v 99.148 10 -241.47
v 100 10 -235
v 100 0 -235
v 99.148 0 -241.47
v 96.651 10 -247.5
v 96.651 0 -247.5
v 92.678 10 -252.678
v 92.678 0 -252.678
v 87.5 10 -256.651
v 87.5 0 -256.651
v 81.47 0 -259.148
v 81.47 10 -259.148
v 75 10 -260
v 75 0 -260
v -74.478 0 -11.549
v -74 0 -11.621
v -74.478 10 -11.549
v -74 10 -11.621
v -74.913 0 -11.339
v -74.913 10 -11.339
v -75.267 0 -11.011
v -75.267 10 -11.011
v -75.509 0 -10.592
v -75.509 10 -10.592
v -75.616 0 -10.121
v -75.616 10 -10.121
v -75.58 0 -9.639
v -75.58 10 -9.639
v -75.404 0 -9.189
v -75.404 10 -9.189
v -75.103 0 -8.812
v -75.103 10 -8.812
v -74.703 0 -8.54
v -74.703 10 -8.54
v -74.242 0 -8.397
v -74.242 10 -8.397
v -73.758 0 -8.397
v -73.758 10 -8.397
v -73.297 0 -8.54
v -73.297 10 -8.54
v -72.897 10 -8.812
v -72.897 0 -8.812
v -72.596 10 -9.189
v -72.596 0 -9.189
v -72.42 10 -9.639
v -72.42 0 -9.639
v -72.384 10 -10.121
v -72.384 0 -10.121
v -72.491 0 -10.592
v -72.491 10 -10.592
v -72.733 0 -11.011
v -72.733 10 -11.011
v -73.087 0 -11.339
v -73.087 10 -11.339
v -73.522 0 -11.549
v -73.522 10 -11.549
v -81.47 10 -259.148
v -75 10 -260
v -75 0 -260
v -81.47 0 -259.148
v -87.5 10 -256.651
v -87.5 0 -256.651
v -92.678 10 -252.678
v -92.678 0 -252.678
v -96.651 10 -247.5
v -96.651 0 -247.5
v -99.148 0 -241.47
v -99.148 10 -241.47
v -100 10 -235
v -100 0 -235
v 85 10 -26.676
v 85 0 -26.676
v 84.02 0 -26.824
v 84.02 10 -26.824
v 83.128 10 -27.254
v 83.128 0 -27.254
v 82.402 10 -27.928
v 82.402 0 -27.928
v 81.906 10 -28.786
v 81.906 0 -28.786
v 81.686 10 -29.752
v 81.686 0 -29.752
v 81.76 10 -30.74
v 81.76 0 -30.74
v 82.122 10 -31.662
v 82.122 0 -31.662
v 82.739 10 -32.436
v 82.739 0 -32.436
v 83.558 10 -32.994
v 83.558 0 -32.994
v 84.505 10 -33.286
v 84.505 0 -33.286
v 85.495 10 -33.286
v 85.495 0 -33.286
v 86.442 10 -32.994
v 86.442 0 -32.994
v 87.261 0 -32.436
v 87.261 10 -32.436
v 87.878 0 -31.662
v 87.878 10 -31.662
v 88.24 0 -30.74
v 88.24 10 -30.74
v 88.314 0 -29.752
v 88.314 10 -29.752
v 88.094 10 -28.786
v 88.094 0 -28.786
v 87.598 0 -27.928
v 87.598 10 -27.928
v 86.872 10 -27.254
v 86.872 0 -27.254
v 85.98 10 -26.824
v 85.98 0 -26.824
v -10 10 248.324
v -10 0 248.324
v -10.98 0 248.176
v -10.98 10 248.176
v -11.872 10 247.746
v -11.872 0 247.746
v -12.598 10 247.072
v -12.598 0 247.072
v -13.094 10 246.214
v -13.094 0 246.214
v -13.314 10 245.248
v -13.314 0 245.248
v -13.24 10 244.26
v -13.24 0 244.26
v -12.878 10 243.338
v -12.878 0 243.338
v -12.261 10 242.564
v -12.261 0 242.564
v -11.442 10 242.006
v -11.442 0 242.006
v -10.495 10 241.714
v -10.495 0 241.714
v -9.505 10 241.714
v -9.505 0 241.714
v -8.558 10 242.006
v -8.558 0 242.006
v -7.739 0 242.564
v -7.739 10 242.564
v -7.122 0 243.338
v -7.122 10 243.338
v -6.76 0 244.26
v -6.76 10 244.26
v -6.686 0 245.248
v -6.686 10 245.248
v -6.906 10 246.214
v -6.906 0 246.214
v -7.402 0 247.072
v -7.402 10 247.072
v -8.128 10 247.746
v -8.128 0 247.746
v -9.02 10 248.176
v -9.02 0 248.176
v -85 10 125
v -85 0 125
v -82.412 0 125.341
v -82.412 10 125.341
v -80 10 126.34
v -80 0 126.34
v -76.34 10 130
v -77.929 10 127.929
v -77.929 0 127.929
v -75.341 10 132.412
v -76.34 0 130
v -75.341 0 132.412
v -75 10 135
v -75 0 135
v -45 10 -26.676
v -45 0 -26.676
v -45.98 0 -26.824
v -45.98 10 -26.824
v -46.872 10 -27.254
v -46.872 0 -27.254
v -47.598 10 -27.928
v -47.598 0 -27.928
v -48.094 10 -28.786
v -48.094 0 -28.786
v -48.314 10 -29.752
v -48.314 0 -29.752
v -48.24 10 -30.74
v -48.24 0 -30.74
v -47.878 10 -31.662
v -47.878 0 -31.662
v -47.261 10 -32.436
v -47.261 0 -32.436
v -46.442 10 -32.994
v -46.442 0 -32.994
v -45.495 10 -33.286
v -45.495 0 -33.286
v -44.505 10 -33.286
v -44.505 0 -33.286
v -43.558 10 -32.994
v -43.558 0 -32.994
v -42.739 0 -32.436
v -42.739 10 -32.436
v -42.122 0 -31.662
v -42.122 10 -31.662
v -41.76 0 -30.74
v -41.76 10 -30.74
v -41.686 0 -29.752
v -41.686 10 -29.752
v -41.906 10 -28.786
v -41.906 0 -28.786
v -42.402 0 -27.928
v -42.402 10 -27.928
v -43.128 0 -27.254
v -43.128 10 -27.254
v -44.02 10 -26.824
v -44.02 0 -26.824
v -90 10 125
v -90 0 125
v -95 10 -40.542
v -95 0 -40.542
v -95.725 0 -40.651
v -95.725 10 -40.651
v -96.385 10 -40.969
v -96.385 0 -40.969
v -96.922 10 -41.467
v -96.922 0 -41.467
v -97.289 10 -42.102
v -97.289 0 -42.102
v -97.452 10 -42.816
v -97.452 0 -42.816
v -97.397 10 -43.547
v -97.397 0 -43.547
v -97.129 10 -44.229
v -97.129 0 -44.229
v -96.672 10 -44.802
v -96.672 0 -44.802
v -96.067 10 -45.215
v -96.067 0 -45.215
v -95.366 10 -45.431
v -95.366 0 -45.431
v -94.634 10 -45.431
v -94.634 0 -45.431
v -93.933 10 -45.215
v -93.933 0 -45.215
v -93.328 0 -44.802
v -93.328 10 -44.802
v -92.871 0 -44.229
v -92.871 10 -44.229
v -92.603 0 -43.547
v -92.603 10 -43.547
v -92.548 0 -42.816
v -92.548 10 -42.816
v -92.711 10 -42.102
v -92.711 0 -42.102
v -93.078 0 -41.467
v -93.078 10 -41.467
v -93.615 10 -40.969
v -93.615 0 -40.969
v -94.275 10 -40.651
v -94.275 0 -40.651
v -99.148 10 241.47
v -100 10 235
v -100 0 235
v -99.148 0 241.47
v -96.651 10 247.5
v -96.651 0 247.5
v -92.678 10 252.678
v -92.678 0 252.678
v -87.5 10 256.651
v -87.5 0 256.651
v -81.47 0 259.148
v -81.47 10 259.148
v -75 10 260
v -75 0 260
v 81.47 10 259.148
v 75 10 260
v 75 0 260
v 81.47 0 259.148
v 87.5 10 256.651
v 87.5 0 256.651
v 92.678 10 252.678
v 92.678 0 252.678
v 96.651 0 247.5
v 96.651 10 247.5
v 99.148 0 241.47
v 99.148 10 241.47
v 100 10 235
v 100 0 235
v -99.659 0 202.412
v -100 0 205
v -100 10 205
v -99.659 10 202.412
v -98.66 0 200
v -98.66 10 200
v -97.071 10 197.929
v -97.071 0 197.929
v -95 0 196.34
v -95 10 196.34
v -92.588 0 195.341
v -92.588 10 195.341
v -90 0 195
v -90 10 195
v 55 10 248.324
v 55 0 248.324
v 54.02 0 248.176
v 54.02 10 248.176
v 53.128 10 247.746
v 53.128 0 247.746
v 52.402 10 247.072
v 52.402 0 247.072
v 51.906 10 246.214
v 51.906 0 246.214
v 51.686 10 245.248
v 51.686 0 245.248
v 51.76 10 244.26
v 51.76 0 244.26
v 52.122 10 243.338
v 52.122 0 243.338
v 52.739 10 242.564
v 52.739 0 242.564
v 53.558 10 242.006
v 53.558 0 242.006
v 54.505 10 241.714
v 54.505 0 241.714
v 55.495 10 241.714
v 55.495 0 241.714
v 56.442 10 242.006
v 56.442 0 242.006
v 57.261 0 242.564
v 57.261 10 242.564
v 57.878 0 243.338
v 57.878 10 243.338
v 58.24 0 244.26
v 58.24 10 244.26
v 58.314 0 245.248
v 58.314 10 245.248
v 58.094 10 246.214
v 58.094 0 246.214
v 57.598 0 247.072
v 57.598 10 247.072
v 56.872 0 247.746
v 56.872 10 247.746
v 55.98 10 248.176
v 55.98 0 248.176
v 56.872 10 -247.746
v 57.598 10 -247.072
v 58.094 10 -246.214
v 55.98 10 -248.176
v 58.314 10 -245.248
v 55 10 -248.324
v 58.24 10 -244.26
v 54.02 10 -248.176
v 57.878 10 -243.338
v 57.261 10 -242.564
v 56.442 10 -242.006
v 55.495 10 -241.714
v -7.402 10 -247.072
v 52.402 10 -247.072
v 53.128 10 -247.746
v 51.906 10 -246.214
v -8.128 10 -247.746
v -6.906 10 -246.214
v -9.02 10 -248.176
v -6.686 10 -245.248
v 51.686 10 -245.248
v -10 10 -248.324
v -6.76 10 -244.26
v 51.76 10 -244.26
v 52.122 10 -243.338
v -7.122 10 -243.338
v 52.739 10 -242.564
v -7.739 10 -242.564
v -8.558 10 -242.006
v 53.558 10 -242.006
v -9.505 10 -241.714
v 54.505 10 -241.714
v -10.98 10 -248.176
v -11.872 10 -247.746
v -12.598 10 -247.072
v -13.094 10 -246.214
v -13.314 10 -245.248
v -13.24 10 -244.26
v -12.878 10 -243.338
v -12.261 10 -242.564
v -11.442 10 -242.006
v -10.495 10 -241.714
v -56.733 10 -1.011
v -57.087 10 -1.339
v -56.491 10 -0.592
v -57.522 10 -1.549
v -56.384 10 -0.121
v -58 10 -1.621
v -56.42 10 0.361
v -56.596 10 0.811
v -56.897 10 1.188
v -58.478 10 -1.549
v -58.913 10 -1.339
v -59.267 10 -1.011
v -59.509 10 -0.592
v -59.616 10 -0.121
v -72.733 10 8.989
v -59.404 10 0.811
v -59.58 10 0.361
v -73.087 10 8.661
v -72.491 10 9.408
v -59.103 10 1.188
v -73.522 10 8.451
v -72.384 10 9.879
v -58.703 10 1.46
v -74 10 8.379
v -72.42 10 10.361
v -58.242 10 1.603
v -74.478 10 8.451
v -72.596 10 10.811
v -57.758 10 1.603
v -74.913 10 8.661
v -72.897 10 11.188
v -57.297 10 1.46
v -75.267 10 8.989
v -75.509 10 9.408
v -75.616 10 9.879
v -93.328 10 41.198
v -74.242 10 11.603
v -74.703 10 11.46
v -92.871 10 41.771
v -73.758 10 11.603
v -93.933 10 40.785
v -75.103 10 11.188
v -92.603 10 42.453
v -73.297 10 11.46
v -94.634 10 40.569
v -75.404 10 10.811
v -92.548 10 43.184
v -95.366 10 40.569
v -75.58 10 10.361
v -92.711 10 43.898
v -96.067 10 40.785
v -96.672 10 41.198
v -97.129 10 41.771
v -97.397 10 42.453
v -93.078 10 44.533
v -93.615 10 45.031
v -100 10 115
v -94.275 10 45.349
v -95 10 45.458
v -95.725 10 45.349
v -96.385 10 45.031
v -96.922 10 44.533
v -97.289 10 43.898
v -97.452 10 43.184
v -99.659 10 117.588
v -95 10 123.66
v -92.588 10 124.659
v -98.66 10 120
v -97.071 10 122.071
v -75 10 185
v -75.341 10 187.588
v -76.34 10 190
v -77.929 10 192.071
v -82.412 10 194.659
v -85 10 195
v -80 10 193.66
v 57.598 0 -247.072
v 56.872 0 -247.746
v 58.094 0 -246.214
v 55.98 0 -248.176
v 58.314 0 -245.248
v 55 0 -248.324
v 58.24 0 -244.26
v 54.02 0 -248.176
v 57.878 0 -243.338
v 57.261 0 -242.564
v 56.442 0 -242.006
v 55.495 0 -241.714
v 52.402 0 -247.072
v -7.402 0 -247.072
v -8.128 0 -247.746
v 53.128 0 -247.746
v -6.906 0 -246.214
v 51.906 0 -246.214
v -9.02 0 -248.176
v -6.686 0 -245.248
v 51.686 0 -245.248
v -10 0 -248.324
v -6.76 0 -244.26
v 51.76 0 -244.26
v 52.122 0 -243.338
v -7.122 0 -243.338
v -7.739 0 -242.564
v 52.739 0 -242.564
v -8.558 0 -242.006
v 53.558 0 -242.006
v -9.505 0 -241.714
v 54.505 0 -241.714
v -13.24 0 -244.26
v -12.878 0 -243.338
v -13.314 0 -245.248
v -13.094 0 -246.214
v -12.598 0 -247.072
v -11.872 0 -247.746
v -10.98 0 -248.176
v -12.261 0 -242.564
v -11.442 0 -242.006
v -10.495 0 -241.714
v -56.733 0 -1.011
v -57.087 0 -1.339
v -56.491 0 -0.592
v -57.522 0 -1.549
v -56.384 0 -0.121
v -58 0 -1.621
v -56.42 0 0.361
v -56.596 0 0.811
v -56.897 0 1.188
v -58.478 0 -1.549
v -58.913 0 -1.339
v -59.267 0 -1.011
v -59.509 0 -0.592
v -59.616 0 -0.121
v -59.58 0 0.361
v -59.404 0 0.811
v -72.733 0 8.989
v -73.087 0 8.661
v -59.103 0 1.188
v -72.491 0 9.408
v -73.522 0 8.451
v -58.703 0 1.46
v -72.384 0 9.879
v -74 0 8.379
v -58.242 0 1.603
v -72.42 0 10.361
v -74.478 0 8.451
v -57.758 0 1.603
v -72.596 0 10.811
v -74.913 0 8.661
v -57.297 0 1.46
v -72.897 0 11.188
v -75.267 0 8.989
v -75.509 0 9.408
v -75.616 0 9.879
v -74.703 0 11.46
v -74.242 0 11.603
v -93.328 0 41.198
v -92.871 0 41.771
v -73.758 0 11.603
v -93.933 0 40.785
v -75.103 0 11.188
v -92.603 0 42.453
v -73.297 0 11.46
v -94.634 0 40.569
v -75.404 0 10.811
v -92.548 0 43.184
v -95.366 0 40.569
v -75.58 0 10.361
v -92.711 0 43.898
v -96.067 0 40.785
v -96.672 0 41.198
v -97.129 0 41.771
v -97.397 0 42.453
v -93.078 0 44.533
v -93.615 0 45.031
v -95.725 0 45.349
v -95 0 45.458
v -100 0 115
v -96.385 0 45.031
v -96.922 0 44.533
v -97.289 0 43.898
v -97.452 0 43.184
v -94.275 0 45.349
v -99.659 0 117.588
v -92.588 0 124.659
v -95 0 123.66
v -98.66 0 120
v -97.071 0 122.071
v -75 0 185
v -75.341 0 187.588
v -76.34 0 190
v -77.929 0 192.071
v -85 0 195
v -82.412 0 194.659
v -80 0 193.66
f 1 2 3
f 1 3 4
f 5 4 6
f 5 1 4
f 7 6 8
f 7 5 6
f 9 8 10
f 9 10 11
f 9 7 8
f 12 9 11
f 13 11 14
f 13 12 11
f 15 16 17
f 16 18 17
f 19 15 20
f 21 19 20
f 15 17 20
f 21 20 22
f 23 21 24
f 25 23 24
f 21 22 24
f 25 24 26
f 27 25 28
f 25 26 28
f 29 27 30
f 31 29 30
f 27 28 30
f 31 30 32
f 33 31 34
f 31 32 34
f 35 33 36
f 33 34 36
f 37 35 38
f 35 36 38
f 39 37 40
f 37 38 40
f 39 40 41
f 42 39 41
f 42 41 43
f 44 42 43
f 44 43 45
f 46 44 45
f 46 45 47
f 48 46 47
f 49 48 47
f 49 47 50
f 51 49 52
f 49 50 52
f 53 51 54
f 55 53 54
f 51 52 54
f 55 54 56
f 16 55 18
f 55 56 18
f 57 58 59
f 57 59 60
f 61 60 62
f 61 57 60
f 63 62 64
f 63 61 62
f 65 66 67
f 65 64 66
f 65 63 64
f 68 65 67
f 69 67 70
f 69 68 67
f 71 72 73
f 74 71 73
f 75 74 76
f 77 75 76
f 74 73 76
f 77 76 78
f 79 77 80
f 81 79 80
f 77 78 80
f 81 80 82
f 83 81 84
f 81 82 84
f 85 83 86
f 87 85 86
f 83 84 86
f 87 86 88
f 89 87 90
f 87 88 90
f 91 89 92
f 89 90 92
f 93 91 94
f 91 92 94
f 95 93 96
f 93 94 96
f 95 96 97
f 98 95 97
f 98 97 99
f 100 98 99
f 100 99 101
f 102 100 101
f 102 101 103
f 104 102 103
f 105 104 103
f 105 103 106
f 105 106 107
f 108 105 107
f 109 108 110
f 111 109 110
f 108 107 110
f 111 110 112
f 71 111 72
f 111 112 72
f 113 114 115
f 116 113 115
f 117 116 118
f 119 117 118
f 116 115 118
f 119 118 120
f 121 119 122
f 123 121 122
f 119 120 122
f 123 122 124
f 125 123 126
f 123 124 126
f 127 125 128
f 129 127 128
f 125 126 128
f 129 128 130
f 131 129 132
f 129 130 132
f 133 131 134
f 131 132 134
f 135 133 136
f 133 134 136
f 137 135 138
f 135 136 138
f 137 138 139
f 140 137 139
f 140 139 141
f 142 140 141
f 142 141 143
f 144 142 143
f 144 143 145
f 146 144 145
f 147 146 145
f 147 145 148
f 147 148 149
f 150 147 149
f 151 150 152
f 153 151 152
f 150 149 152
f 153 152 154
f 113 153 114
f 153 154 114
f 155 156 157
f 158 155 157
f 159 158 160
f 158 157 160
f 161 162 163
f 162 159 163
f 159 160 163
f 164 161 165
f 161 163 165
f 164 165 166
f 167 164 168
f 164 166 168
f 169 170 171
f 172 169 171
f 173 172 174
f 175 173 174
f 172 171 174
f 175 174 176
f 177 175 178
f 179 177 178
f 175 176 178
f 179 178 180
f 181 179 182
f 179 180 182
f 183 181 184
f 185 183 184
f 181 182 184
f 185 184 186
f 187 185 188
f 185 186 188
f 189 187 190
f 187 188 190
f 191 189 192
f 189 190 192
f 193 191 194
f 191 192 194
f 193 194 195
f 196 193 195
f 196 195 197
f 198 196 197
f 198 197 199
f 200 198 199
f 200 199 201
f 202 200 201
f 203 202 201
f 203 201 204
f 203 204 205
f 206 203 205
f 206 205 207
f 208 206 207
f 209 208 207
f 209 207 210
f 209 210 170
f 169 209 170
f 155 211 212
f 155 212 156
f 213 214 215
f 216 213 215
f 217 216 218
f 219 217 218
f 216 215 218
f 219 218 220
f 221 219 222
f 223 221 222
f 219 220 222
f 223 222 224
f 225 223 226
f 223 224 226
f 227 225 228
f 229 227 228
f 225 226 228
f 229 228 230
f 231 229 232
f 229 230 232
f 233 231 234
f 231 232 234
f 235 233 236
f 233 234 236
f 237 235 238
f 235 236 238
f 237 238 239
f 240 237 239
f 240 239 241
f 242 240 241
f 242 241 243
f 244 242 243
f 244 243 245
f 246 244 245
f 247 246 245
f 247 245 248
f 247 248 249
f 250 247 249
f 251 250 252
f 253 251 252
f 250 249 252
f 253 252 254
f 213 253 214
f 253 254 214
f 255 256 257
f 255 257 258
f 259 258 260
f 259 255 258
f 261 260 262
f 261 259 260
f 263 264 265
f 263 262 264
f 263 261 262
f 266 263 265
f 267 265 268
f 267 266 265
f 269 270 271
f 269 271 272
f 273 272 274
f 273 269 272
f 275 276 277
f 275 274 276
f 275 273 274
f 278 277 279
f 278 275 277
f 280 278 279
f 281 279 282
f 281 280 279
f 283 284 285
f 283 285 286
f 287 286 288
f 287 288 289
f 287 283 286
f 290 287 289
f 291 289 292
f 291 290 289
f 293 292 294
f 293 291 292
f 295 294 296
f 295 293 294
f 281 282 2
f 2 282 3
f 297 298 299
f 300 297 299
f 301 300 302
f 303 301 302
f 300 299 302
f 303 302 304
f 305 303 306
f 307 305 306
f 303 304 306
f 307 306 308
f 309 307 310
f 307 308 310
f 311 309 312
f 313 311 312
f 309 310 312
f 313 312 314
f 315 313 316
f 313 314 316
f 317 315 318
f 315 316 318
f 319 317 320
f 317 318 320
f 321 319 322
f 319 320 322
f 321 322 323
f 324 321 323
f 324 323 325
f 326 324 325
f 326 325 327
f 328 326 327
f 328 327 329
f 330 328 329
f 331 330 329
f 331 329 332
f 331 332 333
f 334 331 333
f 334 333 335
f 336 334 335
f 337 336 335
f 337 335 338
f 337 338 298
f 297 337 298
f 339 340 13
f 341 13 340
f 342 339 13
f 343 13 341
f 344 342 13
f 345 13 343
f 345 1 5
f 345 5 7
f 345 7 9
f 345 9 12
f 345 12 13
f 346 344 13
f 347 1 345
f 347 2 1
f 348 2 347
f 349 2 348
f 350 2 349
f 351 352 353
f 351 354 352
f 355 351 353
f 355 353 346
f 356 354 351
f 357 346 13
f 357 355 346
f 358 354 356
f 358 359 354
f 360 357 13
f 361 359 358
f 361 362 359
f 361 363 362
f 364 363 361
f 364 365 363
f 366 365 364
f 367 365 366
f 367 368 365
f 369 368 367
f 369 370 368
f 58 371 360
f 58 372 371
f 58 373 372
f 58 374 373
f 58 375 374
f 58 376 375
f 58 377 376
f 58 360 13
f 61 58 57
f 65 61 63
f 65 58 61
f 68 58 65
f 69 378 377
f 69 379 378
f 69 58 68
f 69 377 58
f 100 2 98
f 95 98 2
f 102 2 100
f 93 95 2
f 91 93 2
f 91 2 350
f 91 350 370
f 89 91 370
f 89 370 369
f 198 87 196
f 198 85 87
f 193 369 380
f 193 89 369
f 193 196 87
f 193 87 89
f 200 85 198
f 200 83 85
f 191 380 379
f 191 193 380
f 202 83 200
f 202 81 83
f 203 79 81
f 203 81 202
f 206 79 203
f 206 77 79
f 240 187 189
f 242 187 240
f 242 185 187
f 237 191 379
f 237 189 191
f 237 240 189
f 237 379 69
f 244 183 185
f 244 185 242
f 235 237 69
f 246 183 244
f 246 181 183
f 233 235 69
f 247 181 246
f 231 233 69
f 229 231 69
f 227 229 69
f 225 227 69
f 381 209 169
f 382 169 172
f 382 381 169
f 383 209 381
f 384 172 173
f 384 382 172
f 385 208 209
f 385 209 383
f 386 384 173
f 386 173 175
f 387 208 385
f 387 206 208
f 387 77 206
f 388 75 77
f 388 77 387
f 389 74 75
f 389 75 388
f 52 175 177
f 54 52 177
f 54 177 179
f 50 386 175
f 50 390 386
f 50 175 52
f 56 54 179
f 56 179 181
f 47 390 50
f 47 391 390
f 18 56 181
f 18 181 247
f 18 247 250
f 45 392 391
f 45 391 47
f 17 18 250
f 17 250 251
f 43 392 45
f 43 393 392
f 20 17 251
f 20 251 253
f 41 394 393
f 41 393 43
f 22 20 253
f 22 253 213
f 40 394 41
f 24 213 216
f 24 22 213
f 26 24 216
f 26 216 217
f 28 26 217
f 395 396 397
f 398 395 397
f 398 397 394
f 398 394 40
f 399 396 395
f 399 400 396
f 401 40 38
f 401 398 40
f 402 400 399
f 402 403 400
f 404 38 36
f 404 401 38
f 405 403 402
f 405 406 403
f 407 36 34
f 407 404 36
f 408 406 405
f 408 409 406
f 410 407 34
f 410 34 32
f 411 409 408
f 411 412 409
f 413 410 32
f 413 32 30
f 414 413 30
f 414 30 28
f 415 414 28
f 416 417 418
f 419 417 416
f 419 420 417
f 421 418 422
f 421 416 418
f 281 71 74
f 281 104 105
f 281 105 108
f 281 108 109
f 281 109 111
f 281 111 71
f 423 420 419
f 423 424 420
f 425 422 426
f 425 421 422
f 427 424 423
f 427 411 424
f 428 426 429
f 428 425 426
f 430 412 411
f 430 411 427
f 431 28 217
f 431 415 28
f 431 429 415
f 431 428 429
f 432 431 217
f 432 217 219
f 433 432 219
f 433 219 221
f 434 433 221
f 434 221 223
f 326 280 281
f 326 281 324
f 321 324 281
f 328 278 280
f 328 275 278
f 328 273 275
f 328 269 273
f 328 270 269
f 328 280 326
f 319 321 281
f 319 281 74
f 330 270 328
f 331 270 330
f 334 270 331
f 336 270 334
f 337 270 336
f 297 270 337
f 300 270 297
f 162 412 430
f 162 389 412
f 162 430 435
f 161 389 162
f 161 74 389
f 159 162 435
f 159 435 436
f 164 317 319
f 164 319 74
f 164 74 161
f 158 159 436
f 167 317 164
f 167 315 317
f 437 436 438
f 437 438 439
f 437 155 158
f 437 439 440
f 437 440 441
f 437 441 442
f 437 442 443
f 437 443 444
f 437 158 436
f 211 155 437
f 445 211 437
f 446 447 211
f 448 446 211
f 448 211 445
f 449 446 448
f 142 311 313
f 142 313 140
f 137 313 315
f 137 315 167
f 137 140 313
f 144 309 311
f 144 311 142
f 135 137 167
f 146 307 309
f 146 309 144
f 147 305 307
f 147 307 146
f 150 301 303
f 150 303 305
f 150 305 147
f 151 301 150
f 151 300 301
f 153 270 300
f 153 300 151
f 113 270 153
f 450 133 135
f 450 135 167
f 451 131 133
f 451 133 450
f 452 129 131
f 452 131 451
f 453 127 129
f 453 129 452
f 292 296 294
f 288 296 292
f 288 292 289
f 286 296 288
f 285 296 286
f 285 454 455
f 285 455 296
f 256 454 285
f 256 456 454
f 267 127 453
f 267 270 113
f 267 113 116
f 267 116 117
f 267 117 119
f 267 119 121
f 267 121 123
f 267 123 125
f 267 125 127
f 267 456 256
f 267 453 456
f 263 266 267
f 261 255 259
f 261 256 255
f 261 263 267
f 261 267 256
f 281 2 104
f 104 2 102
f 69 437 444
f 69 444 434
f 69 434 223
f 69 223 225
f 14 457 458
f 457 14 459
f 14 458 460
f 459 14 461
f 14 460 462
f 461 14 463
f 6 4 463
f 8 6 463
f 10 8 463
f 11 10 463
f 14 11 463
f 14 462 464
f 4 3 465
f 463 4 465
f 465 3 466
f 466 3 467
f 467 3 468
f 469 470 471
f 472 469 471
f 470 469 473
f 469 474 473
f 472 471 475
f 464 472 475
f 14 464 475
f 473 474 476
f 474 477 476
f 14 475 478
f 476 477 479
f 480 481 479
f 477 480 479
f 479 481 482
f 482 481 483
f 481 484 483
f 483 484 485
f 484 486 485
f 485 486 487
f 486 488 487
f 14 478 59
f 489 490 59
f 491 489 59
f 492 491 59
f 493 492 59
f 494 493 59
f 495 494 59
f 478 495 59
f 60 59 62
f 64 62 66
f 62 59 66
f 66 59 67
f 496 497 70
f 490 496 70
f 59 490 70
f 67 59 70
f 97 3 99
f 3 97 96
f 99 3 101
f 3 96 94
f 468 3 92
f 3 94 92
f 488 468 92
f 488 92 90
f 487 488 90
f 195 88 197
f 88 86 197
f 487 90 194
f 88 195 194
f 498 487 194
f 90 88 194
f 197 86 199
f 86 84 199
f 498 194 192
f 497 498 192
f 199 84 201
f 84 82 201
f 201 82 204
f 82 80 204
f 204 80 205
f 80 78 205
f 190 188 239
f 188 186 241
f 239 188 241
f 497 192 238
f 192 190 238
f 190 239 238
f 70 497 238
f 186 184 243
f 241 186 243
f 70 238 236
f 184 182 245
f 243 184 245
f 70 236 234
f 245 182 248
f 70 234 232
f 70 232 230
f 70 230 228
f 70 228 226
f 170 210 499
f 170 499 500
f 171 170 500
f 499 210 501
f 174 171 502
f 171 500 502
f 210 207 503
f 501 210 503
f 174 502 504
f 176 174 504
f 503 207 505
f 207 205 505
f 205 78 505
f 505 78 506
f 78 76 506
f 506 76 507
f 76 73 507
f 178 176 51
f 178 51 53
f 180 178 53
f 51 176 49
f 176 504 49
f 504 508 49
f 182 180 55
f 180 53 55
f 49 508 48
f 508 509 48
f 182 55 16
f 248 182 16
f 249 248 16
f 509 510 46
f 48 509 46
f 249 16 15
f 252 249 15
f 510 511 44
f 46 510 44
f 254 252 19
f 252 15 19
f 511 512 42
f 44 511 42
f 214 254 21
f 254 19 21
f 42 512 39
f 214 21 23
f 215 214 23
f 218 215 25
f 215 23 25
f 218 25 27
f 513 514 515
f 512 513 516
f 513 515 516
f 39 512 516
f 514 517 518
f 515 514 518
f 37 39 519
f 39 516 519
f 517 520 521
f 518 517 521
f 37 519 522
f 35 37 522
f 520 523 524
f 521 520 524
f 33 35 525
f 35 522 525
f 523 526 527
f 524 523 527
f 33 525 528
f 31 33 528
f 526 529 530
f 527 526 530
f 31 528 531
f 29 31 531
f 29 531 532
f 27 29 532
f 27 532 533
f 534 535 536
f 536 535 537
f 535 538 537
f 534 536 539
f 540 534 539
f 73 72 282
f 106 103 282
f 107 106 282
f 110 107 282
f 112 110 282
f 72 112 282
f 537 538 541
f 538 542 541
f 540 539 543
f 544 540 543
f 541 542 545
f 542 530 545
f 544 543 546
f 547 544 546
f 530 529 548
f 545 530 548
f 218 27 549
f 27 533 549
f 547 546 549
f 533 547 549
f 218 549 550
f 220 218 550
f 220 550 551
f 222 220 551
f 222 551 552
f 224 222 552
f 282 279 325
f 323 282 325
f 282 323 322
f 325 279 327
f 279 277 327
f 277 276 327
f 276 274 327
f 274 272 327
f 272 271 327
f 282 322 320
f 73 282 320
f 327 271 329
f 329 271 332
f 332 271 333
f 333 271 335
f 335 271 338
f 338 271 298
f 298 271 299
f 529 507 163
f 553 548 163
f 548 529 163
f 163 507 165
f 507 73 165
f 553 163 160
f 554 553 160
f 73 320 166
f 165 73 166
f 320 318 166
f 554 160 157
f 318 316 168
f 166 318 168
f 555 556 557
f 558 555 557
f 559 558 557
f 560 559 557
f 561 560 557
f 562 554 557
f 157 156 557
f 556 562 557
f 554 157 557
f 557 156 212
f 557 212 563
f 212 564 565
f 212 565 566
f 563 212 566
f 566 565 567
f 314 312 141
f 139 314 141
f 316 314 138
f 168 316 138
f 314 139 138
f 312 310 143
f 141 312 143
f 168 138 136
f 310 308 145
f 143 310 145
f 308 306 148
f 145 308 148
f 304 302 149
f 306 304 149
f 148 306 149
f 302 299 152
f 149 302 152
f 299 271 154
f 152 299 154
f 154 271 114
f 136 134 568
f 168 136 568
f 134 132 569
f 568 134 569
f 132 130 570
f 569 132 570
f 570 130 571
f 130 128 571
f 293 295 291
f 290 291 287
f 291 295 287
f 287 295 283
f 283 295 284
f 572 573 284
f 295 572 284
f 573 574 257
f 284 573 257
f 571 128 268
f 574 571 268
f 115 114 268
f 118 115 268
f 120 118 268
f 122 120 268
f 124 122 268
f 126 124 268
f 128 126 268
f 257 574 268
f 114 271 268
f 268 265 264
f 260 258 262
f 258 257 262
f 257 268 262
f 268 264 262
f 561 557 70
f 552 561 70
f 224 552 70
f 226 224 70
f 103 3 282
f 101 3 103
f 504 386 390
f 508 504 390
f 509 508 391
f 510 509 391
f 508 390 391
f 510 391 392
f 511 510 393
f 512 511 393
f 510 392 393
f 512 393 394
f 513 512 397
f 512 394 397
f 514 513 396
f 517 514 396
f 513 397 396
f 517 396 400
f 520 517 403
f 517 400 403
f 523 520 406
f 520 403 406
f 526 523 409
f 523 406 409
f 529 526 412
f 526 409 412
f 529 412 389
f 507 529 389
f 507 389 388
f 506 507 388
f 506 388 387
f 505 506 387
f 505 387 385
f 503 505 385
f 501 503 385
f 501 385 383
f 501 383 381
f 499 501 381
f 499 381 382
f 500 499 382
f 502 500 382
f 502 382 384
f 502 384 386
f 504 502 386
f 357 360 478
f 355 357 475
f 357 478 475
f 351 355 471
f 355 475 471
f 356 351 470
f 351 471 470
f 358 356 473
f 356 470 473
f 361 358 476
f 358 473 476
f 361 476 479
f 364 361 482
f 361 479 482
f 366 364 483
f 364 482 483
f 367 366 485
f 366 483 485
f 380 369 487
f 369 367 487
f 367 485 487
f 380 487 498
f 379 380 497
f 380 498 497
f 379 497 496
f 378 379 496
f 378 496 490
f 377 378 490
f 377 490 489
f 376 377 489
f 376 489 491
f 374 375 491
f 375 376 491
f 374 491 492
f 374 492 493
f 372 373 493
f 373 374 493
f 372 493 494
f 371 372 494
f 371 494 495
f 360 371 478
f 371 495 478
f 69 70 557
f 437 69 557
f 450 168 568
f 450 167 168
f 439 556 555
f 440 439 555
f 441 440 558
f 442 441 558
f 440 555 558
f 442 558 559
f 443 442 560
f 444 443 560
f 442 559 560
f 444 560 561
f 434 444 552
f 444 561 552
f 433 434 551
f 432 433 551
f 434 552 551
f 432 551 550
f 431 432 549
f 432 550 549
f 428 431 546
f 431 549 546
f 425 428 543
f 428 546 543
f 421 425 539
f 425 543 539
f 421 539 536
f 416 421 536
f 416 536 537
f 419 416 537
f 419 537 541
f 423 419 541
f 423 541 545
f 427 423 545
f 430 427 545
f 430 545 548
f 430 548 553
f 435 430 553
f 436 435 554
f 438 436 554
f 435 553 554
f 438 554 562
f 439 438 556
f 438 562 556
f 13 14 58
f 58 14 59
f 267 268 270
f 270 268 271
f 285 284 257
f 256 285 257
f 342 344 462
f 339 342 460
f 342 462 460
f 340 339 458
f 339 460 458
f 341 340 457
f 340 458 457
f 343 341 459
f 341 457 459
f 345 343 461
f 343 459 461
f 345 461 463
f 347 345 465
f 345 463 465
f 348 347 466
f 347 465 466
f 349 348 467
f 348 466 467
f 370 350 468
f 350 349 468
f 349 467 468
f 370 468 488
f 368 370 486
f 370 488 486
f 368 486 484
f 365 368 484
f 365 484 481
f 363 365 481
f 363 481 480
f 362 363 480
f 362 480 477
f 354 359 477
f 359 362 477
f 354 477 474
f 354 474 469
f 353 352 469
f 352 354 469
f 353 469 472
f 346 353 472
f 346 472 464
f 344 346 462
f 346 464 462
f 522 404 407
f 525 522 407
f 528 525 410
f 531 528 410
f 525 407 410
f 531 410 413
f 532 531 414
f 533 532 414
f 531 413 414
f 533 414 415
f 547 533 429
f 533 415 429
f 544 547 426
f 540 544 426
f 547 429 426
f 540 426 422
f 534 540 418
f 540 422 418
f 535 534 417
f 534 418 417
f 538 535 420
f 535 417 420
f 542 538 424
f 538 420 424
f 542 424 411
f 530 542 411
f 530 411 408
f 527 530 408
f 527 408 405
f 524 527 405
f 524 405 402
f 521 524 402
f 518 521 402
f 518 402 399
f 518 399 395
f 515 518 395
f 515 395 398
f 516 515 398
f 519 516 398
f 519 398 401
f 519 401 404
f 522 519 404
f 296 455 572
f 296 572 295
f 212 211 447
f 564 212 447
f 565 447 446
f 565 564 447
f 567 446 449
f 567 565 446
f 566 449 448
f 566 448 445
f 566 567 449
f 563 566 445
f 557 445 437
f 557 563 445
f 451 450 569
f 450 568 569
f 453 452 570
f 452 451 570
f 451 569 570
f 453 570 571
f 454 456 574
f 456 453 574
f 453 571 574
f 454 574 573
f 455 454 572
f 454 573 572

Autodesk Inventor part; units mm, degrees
ref_plane "YZ Plane" through (0, 0, 0) normal (1, 0, 0) x (0, 1, 0)
ref_plane "XZ Plane" through (0, 0, 0) normal (0, 1, 0) x (-1, 0, 0)
ref_plane "XY Plane" through (0, 0, 0) normal (0, 0, 1) x (1, 0, 0)
sketch "Sketch1" plane through (0, 0, 0) normal (0, 1, 0) x (-1, 0, 0)
  line L0 (-100, -260) -> (100, -260)
  line L1 (100, -260) -> (100, 260)
  line L2 (100, 260) -> (-100, 260)
  line L3 (-100, 260) -> (-100, -260)
  line L4 (-100, -260) -> (100, 260) construction
  line L5 (100, -260) -> (-100, 260) construction
  point P0 (0, 0)
  dimension "d0" = 200
  dimension "d1" = 520
extrude "Extrusion1" add sketch "Sketch1" along normal blind 10
fillet "Fillet1" radius 25 4 edges at (-100, 5, -260) (-100, 5, 260) (100, 5, 260) (100, 5, -260)
sketch "Sketch3" plane through (0, 10, 0) normal (0, 1, 0) x (1, 0, 0)
  line L0 (-75, -260) -> (75, -260) projected
  line L1 (-100, 235) -> (-100, -235) projected
  point P0 (0, 0)
  point P1 (-10, -245)
  point P2 (55, -245)
  dimension "d20" = 15
  dimension "d21" = 90
  dimension "d22" = 65
  dimension "d23" = 15
hole "Hole2" at (-10, 10, 245) at (55, 10, 245) direction (0, -1, 0) diameter 6.647 end through all thread size "M8x1.25" class "6H" standard "ISO Metric profile"
mirror "Mirror1" about plane through (0, 0, 0) normal (0, 0, 1) of "Hole2"
sketch "Sketch4" plane through (0, 10, 0) normal (0, 1, 0) x (1, 0, 0)
  line L0 (75, 260) -> (-75, 260) projected
  line L1 (100, -235) -> (100, 235) projected
  point P0 (0, 0)
  point P1 (-45, 30)
  point P2 (85, 30)
  dimension "d31" = 230
  dimension "d32" = 145
  dimension "d33" = 230
  dimension "d34" = 15
hole "Hole3" at (-45, 10, -30) at (85, 10, -30) direction (0, -1, 0) diameter 6.647 end through all thread size "M8x1.25" class "6H" standard "ISO Metric profile"
sketch "Sketch12" plane through (0, 0, 0) normal (0, -1, 0) x (1, 0, 0)
  line L0 (0, 0) -> (-38.9736, 0) construction
  line L1 (-100, -235) -> (-100, 235) construction
  point P0 (-74, 10)
  point P1 (-74, -10)
  point P2 (-58, 0)
  dimension "d109" = 10
  dimension "d110" = 26
  dimension "d111" = 16
hole "Hole8" at (-74, 0, 10) at (-74, 0, -10) at (-58, 0, 0) direction (0, 1, 0) diameter 3.242 end through all thread size "M4x0.7" class "6H" standard "ISO Metric profile"
sketch "Sketch8" plane through (0, 10, 0) normal (0, 1, 0) x (1, 0, 0)
  line L0 (-100, 235) -> (-100, -235) projected
  line L1 (-100, -125) -> (-75, -125)
  line L2 (-75, -125) -> (-75, -195)
  line L3 (-75, -195) -> (-100, -195)
  line L4 (-100, -195) -> (-100, -125)
  line L5 (-75, -260) -> (75, -260) projected
  point P0 (0, 0)
  dimension "d72" = 25
  dimension "d73" = 70
  dimension "d74" = 65
extrude "Extrusion2" cut sketch "Sketch8" against normal blind 10
fillet "Fillet2" radius 10 4 edges at (-100, 5, 125) (-75, 5, 125) (-100, 5, 195) (-75, 5, 195)
sketch "Sketch13" plane through (0, 10, 0) normal (0, 1, 0) x (1, 0, 0)
  line L0 (-100, 235) -> (-100, -115) construction
  line L1 (-100, 0) -> (0, 0) construction
  point P0 (-95, -43)
  point P1 (-95, 43)
  dimension "d119" = 86
  dimension "d120" = 5
hole "Hole9" at (-95, 10, 43) at (-95, 10, -43) direction (0, -1, 0) diameter 4.917 end through all thread size "M6x1" class "6H" standard "ISO Metric profile"
sketch "Sketch9" plane through (0, 10, 0) normal (0, 1, 0) x (1, 0, 0)
  line L0 (-90, 55) -> (-100, 55)
  line L1 (-100, 55) -> (-100, -55)
  line L2 (-100, -55) -> (-90, -55)
  line L3 (-90, -55) -> (-90, 55)
  line L4 (-100, 235) -> (-100, -115) projected
  line L5 (75, 260) -> (-75, 260) projected
  line L6 (0, 0) -> (-100, 0) construction
  dimension "d78" = 10
  dimension "d79" = 110
  dimension "d80" = 0
sketch "Sketch10" plane through (0, 10, 0) normal (0, 1, 0) x (1, 0, 0)
  line L0 (-30, 180) -> (-60, 180)
  line L1 (-60, 180) -> (-60, 110)
  line L2 (-60, 110) -> (-30, 110)
  line L3 (-30, 110) -> (-30, 180)
  line L4 (-100, 235) -> (-100, -115) projected
  line L5 (75, 260) -> (-75, 260) projected
  point P0 (0, 0)
  dimension "d85" = 30
  dimension "d86" = 70
  dimension "d87" = 40
  dimension "d88" = 80
sketch "Sketch11" plane through (0, 10, 0) normal (0, 1, 0) x (1, 0, 0)
  line L0 (-100, 235) -> (-100, -115) projected
  line L1 (-100, -205) -> (-100, -235) projected
  line L2 (75, 260) -> (-75, 260) projected
  line L3 (-75, -260) -> (75, -260) projected
  point P0 (0, 0)
  point P1 (-50, 220)
  point P2 (-50, 70)
  point P3 (-50, -80)
  point P4 (-50, -155)
  point P5 (-50, -230)
  dimension "d92" = 50
  dimension "d93" = 50
  dimension "d94" = 50
  dimension "d95" = 50
  dimension "d96" = 50
  dimension "d97" = 40
  dimension "d98" = 190
  dimension "d99" = 180
  dimension "d100" = 105
  dimension "d101" = 30
properties part number "Top_plate" material "Stainless Steel"
